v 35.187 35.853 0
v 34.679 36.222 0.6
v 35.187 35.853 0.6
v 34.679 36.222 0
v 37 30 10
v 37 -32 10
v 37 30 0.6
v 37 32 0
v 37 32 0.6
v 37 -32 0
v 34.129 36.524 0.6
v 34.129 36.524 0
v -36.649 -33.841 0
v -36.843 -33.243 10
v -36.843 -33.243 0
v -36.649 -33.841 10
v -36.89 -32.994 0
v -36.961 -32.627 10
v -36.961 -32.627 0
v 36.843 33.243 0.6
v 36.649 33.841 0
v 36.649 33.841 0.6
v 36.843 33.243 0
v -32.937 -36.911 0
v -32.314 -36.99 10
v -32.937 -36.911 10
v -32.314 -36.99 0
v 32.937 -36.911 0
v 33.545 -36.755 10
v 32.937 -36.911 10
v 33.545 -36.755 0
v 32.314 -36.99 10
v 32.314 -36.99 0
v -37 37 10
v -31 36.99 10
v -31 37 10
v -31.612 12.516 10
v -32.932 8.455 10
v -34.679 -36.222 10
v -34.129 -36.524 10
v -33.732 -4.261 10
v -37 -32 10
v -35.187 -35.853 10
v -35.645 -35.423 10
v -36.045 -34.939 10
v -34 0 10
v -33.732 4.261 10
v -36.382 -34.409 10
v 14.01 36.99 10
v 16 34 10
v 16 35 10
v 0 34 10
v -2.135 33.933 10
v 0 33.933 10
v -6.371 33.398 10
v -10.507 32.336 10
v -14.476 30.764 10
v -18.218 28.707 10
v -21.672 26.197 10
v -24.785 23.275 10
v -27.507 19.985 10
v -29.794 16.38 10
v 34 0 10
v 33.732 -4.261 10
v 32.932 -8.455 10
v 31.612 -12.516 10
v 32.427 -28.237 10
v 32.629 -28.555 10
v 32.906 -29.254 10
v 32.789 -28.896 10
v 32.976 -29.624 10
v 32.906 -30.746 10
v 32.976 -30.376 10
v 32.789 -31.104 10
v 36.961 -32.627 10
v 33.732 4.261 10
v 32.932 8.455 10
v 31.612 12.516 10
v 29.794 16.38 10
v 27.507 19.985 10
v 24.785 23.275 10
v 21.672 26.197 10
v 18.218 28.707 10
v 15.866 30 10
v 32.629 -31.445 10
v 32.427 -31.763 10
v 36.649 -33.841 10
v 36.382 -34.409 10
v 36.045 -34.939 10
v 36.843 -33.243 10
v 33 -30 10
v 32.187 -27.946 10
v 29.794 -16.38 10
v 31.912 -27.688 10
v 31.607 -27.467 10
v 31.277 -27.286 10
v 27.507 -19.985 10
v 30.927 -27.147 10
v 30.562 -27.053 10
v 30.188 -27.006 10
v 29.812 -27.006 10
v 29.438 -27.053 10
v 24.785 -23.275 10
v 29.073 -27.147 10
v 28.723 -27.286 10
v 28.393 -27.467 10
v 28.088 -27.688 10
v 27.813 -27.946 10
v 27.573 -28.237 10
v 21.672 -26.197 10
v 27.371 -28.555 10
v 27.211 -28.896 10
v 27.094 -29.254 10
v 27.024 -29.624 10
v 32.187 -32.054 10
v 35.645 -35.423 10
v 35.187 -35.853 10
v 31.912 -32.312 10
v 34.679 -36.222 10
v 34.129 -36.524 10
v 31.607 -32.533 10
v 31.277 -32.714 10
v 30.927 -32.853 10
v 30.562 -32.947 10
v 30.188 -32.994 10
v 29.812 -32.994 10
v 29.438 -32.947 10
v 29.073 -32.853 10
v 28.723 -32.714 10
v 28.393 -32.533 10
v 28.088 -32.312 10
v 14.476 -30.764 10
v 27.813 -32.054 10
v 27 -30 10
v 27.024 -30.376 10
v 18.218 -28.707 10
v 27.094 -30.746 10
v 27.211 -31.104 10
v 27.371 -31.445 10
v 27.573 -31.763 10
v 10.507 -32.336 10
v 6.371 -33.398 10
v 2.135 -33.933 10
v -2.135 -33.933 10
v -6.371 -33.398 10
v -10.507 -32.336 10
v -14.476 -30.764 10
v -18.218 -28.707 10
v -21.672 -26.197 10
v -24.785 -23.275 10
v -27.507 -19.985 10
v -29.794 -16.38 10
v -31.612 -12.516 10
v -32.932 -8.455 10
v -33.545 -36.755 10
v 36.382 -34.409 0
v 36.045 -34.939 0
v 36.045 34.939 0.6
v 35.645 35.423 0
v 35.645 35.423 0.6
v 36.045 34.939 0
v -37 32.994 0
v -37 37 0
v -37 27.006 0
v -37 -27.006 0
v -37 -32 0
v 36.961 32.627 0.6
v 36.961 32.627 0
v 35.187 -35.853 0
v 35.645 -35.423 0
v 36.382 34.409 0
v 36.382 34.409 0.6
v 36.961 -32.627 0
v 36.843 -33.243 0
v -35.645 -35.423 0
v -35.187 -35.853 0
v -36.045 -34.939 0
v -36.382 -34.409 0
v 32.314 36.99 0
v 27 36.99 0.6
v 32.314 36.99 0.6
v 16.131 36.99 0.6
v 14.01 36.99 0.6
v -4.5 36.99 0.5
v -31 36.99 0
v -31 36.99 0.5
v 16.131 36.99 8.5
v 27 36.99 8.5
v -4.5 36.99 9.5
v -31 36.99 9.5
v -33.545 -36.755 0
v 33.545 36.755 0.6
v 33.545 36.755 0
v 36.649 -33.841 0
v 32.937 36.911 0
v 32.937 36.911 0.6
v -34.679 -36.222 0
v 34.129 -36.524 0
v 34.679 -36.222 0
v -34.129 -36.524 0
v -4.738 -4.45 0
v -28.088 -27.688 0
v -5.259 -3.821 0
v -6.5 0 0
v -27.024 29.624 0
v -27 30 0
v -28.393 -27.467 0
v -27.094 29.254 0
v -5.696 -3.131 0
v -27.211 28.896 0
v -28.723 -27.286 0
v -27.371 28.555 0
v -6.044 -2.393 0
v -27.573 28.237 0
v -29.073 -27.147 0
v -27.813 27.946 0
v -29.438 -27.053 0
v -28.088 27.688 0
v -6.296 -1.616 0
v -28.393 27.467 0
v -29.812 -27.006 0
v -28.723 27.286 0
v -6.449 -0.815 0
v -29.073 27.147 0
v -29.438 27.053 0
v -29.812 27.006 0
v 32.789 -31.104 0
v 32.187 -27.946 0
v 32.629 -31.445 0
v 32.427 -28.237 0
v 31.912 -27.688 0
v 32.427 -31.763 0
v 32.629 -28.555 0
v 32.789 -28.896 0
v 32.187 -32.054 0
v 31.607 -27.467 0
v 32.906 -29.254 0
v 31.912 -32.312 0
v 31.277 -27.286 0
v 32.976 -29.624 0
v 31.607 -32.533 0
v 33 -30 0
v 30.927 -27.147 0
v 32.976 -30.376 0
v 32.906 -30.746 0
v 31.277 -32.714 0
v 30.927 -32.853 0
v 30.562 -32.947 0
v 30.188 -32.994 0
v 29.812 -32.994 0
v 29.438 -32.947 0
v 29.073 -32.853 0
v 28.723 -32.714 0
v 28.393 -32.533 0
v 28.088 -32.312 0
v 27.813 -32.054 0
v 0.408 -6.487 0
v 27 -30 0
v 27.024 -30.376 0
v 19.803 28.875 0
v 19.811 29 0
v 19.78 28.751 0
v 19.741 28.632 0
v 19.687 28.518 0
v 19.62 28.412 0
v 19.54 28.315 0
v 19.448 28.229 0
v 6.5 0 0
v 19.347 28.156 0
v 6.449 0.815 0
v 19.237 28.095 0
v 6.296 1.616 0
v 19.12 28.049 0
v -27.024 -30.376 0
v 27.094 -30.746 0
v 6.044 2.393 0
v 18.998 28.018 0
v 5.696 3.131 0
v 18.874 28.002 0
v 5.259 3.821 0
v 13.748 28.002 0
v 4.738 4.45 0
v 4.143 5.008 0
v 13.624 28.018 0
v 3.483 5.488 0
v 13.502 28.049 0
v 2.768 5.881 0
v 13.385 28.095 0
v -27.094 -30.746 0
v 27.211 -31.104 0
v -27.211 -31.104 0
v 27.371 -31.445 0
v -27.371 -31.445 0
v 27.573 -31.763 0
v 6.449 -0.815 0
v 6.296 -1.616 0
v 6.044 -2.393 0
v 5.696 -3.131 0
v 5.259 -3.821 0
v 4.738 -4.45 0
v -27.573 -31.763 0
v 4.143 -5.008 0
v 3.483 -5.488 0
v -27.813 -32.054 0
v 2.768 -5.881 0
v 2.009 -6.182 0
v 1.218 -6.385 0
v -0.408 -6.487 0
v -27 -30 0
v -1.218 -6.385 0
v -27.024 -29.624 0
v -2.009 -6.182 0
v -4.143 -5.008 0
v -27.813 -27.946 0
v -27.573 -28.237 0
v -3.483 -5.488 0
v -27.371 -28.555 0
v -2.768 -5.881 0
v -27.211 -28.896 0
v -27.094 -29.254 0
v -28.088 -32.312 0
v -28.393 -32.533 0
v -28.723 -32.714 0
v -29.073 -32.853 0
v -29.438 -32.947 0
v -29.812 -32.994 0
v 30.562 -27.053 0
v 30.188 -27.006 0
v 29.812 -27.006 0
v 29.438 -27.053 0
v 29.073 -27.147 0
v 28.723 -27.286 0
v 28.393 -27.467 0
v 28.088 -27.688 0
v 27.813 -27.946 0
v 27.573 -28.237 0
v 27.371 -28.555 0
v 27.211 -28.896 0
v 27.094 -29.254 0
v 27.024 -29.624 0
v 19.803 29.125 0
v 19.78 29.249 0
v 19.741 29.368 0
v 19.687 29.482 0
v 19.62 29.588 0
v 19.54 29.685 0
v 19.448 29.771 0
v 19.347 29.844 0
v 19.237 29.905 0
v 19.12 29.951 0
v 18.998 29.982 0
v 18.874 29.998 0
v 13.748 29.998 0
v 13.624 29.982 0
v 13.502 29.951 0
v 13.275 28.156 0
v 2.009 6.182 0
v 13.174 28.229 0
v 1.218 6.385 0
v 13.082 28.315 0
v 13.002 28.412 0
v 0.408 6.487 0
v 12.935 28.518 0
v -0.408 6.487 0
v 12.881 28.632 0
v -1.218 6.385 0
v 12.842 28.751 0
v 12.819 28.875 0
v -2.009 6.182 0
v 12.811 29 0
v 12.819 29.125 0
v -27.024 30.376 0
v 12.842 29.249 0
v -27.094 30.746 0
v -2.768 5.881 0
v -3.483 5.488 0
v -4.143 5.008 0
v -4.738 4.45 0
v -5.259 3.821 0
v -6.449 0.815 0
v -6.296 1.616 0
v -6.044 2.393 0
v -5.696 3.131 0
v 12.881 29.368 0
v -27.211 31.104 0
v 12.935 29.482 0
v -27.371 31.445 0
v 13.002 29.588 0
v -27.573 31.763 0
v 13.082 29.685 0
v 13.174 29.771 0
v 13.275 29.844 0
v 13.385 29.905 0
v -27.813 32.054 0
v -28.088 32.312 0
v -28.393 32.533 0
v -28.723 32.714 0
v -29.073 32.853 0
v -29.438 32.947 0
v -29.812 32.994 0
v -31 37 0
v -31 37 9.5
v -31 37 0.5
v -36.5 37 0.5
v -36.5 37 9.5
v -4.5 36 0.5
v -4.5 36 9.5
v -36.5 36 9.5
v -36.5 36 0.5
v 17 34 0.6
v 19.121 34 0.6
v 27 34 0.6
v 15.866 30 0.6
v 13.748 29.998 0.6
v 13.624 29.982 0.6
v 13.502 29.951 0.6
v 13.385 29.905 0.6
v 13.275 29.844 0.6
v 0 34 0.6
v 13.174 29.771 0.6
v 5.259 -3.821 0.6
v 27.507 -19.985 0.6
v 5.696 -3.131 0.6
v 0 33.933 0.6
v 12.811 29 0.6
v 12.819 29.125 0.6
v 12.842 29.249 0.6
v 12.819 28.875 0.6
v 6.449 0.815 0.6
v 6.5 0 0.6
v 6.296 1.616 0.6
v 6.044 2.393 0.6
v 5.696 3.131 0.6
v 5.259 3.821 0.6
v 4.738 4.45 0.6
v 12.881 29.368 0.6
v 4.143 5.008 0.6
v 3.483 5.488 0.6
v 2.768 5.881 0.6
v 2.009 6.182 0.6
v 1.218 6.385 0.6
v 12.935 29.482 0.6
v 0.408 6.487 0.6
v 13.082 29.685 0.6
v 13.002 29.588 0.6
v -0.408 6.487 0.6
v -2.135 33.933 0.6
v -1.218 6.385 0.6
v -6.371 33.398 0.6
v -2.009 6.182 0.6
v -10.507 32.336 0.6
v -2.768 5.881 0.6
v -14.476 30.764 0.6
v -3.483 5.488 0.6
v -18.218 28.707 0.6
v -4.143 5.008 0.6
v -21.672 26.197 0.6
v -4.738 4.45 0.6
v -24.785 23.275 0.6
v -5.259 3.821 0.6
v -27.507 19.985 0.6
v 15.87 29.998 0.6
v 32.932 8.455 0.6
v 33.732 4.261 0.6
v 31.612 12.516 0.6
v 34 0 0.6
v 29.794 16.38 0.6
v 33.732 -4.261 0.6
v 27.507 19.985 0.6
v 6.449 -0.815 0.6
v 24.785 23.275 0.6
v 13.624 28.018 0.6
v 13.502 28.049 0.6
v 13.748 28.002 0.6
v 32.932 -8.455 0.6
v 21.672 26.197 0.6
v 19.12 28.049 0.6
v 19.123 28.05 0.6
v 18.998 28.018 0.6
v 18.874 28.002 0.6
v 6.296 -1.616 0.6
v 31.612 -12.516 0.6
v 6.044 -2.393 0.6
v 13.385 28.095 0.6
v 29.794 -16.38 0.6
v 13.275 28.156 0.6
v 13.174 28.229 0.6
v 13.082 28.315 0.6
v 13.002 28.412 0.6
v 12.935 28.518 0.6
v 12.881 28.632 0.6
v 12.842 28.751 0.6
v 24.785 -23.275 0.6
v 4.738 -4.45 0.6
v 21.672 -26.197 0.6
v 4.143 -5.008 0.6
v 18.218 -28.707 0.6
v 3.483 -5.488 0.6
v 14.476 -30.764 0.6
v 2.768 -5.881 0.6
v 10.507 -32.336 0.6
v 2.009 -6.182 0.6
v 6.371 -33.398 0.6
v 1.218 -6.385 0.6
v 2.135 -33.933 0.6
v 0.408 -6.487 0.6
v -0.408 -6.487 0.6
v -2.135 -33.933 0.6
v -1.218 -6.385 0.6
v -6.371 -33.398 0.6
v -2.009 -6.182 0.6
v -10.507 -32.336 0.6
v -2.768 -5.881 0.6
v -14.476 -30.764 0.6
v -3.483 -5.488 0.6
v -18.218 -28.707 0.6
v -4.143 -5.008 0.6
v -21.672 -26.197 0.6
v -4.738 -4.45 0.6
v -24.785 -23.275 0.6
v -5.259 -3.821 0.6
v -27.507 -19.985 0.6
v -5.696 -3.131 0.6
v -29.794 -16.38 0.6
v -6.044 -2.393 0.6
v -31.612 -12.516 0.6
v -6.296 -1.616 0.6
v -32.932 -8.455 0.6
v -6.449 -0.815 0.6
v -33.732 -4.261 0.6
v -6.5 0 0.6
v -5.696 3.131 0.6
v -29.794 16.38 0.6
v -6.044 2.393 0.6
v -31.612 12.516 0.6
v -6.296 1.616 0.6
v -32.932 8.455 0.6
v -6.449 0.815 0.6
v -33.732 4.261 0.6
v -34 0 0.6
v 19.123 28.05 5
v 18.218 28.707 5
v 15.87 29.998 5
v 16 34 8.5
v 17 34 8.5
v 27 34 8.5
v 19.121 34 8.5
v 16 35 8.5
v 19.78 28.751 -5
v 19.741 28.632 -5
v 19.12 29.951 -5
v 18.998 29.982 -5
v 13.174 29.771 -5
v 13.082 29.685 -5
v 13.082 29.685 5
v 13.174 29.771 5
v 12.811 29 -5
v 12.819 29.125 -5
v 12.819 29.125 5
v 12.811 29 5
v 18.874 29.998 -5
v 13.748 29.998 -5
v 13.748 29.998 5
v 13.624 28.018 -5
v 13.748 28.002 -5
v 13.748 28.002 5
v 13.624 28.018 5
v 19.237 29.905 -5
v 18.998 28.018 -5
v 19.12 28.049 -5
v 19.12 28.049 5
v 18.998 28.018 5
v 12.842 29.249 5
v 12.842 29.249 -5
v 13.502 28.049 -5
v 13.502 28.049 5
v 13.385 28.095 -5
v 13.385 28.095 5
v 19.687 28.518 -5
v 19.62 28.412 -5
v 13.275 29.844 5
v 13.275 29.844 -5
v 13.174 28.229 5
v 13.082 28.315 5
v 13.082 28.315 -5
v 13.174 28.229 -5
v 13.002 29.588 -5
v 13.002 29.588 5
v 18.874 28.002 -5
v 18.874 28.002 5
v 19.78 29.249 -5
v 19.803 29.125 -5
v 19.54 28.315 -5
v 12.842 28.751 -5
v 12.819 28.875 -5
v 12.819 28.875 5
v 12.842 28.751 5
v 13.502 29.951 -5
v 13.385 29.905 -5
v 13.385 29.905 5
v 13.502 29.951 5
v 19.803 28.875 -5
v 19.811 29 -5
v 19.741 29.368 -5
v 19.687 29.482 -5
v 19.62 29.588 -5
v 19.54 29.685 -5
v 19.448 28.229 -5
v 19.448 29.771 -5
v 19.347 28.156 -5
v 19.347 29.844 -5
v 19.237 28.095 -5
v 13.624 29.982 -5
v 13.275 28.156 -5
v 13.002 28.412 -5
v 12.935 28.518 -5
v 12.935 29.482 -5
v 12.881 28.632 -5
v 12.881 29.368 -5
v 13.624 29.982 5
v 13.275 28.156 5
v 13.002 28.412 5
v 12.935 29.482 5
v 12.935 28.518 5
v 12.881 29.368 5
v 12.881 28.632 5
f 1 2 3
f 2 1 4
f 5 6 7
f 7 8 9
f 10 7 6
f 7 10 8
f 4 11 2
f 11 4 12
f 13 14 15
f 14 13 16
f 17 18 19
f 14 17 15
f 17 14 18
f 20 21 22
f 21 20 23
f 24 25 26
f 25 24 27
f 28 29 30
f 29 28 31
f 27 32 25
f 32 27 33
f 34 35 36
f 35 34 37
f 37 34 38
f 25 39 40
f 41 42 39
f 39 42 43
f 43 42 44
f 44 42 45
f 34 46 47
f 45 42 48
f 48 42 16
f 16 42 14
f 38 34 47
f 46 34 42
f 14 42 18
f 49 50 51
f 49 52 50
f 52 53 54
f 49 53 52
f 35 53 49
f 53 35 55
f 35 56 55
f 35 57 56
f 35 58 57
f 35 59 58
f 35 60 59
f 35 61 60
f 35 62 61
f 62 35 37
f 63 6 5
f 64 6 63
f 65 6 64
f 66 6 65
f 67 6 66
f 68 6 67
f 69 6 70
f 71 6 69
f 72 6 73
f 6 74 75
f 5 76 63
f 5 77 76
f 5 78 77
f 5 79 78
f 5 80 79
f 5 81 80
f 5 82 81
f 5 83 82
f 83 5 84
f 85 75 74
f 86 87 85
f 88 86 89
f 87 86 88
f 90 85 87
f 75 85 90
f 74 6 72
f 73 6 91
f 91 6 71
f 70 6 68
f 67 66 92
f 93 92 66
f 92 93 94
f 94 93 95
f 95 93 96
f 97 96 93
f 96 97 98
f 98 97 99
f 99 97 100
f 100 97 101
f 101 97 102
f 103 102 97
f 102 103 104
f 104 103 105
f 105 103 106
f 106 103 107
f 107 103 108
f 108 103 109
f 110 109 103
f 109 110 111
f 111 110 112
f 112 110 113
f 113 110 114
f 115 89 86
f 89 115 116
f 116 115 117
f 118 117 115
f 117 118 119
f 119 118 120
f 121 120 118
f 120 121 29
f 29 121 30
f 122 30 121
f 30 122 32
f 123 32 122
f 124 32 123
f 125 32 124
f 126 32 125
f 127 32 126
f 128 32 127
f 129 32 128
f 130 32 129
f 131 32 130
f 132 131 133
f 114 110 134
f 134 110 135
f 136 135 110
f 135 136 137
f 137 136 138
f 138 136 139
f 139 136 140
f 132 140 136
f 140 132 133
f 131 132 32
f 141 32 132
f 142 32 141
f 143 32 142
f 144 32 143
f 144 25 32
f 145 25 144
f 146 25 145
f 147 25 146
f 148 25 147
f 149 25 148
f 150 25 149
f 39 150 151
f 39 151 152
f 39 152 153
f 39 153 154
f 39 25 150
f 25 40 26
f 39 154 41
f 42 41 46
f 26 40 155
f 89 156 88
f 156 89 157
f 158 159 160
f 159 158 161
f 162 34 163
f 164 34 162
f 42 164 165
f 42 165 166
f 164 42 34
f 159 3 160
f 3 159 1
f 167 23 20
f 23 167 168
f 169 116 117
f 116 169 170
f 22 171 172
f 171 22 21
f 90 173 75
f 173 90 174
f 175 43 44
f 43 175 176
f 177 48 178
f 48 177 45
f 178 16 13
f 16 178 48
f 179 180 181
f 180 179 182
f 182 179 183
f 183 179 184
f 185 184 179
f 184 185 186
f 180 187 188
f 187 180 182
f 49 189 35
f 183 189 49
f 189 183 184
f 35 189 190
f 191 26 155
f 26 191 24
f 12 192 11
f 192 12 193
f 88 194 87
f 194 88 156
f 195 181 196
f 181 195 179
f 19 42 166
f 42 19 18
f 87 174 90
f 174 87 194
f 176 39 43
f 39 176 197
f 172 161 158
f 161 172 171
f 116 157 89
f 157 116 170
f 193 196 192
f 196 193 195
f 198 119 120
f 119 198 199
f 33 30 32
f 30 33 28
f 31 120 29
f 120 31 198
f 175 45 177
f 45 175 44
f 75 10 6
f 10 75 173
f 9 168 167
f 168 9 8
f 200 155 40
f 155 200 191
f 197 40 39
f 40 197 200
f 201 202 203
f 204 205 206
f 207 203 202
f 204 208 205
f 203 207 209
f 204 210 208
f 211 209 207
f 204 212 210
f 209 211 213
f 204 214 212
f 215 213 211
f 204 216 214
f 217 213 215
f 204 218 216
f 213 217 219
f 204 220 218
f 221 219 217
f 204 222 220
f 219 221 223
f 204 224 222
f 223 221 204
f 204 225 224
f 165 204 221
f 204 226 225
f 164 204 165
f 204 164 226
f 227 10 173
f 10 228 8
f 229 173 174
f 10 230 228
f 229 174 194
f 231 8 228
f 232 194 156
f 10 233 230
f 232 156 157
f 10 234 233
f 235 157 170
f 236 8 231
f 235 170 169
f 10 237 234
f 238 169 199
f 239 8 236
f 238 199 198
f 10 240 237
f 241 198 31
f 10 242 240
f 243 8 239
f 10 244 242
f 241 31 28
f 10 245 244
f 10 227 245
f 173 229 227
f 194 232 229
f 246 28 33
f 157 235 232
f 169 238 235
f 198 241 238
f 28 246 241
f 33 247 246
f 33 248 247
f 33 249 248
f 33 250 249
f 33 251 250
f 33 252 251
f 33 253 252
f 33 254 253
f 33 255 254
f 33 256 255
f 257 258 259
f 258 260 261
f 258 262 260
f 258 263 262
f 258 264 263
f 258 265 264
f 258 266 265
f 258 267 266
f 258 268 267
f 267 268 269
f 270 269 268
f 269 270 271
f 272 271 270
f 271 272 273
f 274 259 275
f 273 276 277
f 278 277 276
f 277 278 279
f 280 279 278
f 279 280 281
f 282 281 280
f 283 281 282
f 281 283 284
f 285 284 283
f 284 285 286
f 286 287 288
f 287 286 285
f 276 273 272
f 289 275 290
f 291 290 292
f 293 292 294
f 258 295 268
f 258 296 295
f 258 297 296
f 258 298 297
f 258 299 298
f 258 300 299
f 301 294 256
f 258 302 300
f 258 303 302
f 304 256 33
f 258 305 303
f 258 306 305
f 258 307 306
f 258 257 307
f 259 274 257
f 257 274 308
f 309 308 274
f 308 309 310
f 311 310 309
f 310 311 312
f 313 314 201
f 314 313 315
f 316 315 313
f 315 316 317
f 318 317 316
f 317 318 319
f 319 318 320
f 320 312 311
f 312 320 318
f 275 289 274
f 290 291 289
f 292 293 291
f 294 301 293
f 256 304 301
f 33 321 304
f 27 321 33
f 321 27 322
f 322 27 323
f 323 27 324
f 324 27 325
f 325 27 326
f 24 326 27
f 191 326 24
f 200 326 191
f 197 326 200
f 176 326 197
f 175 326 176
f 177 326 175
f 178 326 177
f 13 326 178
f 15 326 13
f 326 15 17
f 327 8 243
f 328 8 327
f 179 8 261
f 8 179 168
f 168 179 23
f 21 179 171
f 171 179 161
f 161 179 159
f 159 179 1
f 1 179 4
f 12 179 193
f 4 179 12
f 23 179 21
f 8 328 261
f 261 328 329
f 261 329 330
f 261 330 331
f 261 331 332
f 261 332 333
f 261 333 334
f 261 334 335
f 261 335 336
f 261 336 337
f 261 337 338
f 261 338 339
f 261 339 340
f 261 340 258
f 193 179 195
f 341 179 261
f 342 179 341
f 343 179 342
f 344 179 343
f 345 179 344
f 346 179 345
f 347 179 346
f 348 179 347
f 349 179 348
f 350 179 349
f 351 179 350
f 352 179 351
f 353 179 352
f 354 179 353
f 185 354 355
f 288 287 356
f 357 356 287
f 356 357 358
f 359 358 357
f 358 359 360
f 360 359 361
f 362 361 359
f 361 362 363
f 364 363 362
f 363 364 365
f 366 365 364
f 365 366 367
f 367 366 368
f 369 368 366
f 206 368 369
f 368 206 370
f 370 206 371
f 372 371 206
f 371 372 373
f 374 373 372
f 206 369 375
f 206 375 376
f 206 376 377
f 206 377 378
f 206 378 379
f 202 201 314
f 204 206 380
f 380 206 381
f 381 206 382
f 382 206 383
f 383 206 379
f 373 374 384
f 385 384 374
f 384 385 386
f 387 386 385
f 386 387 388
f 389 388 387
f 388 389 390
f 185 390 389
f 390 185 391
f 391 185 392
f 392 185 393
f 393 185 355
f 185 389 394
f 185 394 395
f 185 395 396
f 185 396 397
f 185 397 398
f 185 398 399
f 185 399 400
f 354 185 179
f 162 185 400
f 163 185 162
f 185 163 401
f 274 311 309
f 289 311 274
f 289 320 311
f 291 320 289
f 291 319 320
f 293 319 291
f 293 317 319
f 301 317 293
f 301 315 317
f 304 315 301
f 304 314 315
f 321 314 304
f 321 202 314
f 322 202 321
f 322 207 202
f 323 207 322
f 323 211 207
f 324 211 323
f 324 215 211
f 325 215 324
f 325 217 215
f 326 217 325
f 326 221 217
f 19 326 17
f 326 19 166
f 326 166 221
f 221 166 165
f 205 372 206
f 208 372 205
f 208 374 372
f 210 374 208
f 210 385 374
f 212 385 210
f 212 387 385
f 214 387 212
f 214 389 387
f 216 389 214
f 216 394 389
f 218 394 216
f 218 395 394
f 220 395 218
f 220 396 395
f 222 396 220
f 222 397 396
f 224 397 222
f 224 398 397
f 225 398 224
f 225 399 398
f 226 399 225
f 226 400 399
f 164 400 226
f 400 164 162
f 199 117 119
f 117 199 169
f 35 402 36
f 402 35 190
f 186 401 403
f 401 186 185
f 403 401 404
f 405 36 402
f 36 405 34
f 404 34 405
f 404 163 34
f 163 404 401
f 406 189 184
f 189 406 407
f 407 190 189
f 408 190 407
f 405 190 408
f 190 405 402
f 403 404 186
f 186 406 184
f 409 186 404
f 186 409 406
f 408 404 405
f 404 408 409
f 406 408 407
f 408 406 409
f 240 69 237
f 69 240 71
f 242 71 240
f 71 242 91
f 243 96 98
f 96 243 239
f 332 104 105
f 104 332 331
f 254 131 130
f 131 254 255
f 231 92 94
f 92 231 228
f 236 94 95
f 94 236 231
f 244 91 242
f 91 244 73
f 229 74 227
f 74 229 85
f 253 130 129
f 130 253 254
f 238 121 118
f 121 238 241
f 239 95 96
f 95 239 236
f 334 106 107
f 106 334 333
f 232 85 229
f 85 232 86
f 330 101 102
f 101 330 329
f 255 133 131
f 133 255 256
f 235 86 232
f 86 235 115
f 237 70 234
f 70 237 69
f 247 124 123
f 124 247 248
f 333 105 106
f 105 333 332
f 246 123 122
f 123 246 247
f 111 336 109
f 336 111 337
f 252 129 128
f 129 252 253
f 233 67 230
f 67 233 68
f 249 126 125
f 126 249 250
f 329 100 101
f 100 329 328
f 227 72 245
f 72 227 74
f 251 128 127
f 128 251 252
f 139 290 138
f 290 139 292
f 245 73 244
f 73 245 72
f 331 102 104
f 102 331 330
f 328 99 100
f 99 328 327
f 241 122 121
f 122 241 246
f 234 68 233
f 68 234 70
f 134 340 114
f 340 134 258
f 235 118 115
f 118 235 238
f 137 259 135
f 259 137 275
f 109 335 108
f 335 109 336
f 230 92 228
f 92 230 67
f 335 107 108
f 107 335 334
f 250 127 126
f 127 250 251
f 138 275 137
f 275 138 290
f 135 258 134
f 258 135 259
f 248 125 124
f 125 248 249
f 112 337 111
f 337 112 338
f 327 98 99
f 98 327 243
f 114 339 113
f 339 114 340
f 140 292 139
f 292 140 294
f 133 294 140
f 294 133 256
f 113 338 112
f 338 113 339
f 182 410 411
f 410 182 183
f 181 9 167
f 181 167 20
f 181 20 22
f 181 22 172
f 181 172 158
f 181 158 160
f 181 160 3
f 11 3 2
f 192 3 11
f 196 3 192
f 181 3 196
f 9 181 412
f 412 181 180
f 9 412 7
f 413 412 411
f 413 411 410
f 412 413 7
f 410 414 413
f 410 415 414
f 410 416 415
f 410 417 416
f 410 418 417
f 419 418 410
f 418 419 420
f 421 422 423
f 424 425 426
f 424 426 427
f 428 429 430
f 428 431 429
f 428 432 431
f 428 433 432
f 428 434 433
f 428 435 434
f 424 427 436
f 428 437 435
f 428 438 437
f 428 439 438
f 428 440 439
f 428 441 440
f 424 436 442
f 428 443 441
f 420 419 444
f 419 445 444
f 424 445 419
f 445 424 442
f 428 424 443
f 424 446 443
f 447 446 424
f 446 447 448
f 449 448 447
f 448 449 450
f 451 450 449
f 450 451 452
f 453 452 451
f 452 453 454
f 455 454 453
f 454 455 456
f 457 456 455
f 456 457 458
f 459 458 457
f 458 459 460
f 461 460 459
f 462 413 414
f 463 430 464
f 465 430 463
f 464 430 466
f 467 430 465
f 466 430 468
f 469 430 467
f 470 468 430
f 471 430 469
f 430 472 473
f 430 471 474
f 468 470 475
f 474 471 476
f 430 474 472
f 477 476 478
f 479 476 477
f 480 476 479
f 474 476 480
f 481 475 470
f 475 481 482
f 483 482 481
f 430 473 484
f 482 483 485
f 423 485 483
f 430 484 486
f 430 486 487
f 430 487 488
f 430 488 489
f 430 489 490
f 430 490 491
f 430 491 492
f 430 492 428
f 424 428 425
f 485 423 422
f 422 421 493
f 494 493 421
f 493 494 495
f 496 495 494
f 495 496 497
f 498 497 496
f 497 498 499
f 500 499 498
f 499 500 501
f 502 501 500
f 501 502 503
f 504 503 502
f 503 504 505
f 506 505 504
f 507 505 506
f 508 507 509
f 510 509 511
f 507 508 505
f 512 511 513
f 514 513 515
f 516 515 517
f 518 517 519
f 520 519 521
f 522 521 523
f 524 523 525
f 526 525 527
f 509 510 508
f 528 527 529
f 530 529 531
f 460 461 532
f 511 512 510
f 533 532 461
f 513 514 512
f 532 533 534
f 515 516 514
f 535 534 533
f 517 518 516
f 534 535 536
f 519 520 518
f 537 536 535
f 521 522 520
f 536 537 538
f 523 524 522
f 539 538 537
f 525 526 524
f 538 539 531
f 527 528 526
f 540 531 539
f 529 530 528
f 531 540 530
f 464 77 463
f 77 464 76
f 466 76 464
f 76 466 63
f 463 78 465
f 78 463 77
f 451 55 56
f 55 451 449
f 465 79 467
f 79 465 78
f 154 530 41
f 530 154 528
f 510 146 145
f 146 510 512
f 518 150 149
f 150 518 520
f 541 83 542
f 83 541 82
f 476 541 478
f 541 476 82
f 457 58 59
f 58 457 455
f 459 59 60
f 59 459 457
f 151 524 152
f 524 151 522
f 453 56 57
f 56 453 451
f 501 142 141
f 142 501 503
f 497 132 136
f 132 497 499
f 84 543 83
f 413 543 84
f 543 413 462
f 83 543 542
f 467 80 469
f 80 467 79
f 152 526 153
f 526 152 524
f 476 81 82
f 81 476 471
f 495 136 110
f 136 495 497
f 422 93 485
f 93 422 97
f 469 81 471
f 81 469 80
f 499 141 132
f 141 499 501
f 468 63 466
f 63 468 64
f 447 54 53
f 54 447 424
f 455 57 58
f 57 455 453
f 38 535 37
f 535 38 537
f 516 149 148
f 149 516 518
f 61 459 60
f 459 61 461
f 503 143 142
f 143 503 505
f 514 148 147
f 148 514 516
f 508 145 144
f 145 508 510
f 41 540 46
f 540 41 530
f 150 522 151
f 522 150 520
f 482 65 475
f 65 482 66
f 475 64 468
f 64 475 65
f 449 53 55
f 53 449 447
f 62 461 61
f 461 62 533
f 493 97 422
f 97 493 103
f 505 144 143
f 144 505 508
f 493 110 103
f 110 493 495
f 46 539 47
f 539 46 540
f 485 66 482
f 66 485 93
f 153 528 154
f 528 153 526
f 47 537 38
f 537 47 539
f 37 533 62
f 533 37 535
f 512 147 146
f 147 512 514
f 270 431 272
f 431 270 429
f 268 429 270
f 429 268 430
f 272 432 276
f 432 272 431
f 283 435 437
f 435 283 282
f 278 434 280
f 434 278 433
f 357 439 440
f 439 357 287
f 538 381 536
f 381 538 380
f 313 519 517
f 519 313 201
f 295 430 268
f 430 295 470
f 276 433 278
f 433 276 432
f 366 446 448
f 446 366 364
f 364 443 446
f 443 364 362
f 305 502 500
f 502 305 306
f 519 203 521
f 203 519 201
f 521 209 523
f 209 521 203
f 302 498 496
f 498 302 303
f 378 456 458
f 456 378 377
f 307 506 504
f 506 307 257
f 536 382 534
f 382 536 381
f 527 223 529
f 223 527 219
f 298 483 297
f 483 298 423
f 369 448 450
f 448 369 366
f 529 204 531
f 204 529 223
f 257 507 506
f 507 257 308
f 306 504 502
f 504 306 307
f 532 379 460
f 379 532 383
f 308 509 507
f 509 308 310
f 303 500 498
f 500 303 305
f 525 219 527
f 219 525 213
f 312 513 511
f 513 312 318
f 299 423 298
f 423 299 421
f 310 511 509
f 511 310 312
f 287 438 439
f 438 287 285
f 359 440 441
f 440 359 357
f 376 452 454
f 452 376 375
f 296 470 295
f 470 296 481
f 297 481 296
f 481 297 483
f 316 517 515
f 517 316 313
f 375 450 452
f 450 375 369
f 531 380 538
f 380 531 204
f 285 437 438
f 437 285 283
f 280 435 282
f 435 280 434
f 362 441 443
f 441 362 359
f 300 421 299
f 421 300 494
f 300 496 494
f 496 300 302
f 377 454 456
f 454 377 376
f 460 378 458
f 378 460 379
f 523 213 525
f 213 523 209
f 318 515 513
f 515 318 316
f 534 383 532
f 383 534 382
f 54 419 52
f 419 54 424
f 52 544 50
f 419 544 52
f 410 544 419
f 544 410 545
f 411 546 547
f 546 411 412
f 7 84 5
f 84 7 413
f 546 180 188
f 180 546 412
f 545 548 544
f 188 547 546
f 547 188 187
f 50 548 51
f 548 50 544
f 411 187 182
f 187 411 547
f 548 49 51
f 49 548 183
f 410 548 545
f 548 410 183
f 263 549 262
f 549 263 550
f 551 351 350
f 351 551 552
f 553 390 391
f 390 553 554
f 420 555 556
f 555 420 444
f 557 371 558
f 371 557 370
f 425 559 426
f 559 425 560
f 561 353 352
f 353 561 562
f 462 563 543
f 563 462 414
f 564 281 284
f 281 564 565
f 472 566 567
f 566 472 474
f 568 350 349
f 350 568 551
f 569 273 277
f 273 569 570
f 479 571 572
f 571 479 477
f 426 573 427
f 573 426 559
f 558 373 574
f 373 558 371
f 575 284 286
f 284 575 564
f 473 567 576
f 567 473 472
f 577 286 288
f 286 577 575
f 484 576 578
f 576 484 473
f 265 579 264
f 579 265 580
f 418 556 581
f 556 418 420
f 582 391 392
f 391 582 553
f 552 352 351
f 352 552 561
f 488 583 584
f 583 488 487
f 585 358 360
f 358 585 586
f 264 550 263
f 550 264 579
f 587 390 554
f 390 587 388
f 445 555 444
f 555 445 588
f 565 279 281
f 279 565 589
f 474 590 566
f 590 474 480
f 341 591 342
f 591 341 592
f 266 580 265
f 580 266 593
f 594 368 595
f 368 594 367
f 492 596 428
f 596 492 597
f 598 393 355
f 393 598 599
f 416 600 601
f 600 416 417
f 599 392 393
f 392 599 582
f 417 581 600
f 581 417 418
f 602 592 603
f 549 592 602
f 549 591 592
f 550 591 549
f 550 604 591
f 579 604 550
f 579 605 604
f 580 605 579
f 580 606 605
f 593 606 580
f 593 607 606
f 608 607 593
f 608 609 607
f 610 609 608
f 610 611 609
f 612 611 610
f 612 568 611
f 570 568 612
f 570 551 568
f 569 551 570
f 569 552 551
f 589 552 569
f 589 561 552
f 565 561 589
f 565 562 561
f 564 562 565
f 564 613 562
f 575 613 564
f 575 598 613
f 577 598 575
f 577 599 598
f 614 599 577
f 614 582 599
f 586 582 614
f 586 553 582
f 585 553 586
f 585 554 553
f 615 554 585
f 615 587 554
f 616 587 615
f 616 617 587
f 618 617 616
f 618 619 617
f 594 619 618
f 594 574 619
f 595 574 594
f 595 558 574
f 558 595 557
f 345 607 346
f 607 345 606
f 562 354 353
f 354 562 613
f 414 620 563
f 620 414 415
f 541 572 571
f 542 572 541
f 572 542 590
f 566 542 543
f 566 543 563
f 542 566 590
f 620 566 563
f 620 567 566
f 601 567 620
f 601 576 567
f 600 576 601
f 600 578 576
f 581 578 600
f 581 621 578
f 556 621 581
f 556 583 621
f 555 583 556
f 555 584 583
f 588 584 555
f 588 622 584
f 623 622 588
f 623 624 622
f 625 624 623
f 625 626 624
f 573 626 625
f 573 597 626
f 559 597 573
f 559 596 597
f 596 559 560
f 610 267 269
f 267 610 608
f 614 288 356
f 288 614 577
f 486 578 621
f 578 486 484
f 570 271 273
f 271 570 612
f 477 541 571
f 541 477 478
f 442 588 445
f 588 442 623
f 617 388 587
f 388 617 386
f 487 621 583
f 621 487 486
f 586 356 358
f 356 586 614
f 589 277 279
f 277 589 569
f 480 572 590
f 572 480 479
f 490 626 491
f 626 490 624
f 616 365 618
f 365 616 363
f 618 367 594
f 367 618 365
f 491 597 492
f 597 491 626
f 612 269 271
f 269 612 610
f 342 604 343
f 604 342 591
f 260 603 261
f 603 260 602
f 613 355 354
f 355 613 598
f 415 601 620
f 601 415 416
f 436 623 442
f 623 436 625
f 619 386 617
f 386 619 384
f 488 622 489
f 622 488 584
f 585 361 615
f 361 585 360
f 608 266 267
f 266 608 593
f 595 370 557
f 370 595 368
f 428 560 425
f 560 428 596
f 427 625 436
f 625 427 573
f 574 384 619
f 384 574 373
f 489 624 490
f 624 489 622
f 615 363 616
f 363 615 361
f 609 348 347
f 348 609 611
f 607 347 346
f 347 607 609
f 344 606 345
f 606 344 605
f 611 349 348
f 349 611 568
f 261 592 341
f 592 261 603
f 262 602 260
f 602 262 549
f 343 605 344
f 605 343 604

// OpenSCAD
$fn = 50;


union() {
	difference() {
		union() {
			hull() {
				translate(v = [-32.0000000000, 32.0000000000, 0]) {
					cylinder(h = 10, r = 5);
				}
				translate(v = [32.0000000000, 32.0000000000, 0]) {
					cylinder(h = 10, r = 5);
				}
				translate(v = [-32.0000000000, -32.0000000000, 0]) {
					cylinder(h = 10, r = 5);
				}
				translate(v = [32.0000000000, -32.0000000000, 0]) {
					cylinder(h = 10, r = 5);
				}
			}
			translate(v = [-37.0000000000, 31.0000000000, 0]) {
				cube(size = [6, 6, 10]);
			}
		}
		union() {
			translate(v = [-37.5000000000, -30.0000000000, -250.0000000000]) {
				rotate(a = [0, 0, 0]) {
					difference() {
						union() {
							hull() {
								translate(v = [7.5000000000, 0, 0]) {
									cylinder(h = 250, r = 3.0000000000, r1 = 3.0000000000, r2 = 3.0000000000);
								}
								translate(v = [-7.5000000000, 0, 0]) {
									cylinder(h = 250, r = 3.0000000000, r1 = 3.0000000000, r2 = 3.0000000000);
								}
							}
						}
						union();
					}
				}
			}
			translate(v = [-37.5000000000, 30.0000000000, -250.0000000000]) {
				rotate(a = [0, 0, 0]) {
					difference() {
						union() {
							hull() {
								translate(v = [7.5000000000, 0, 0]) {
									cylinder(h = 250, r = 3.0000000000, r1 = 3.0000000000, r2 = 3.0000000000);
								}
								translate(v = [-7.5000000000, 0, 0]) {
									cylinder(h = 250, r = 3.0000000000, r1 = 3.0000000000, r2 = 3.0000000000);
								}
							}
						}
						union();
					}
				}
			}
			translate(v = [-36.5000000000, 36.0000000000, 0.5000000000]) {
				cube(size = [32, 1, 9.0000000000]);
			}
			translate(v = [30.0000000000, -30.0000000000, 0]) {
				cylinder(h = 100, r = 3.0000000000);
			}
			translate(v = [0, 0, 0.6000000000]) {
				cylinder(h = 12.4000000000, r = 34.0000000000);
			}
			translate(v = [0, 0, -5.0000000000]) {
				cylinder(h = 10, r = 6.5000000000);
			}
			translate(v = [0.0000000000, 30.0000000000, 0.6000000000]) {
				cube(size = [37.0000000000, 4, 12.4000000000]);
			}
			translate(v = [27.0000000000, 30.0000000000, 0.6000000000]) {
				cube(size = [10, 7, 12.4000000000]);
			}
			translate(v = [16.0000000000, 30.0000000000, 8.5000000000]) {
				cube(size = [21, 7, 1.5000000000]);
			}
			translate(v = [13.2500000000, 37.7500000000, 0.6000000000]) {
				rotate(a = [0, 0, -45]) {
					cube(size = [7.5000000000, 1.5000000000, 12.4000000000]);
				}
			}
			translate(v = [7.0610000000, 28.0000000000, 0.6000000000]) {
				cube(size = [7.5000000000, 2, 9.4000000000]);
			}
		}
	}
	union() {
		translate(v = [16.3110000000, 29.0000000000, -5.0000000000]) {
			rotate(a = [0, 0, 0]) {
				difference() {
					union() {
						#hull() {
							#translate(v = [2.5000000000, 0, 0]) {
								cylinder(h = 10, r = 1.0000000000, r1 = 1.0000000000, r2 = 1.0000000000);
							}
							#translate(v = [-2.5000000000, 0, 0]) {
								cylinder(h = 10, r = 1.0000000000, r1 = 1.0000000000, r2 = 1.0000000000);
							}
						}
					}
					union();
				}
			}
		}
	}
}
